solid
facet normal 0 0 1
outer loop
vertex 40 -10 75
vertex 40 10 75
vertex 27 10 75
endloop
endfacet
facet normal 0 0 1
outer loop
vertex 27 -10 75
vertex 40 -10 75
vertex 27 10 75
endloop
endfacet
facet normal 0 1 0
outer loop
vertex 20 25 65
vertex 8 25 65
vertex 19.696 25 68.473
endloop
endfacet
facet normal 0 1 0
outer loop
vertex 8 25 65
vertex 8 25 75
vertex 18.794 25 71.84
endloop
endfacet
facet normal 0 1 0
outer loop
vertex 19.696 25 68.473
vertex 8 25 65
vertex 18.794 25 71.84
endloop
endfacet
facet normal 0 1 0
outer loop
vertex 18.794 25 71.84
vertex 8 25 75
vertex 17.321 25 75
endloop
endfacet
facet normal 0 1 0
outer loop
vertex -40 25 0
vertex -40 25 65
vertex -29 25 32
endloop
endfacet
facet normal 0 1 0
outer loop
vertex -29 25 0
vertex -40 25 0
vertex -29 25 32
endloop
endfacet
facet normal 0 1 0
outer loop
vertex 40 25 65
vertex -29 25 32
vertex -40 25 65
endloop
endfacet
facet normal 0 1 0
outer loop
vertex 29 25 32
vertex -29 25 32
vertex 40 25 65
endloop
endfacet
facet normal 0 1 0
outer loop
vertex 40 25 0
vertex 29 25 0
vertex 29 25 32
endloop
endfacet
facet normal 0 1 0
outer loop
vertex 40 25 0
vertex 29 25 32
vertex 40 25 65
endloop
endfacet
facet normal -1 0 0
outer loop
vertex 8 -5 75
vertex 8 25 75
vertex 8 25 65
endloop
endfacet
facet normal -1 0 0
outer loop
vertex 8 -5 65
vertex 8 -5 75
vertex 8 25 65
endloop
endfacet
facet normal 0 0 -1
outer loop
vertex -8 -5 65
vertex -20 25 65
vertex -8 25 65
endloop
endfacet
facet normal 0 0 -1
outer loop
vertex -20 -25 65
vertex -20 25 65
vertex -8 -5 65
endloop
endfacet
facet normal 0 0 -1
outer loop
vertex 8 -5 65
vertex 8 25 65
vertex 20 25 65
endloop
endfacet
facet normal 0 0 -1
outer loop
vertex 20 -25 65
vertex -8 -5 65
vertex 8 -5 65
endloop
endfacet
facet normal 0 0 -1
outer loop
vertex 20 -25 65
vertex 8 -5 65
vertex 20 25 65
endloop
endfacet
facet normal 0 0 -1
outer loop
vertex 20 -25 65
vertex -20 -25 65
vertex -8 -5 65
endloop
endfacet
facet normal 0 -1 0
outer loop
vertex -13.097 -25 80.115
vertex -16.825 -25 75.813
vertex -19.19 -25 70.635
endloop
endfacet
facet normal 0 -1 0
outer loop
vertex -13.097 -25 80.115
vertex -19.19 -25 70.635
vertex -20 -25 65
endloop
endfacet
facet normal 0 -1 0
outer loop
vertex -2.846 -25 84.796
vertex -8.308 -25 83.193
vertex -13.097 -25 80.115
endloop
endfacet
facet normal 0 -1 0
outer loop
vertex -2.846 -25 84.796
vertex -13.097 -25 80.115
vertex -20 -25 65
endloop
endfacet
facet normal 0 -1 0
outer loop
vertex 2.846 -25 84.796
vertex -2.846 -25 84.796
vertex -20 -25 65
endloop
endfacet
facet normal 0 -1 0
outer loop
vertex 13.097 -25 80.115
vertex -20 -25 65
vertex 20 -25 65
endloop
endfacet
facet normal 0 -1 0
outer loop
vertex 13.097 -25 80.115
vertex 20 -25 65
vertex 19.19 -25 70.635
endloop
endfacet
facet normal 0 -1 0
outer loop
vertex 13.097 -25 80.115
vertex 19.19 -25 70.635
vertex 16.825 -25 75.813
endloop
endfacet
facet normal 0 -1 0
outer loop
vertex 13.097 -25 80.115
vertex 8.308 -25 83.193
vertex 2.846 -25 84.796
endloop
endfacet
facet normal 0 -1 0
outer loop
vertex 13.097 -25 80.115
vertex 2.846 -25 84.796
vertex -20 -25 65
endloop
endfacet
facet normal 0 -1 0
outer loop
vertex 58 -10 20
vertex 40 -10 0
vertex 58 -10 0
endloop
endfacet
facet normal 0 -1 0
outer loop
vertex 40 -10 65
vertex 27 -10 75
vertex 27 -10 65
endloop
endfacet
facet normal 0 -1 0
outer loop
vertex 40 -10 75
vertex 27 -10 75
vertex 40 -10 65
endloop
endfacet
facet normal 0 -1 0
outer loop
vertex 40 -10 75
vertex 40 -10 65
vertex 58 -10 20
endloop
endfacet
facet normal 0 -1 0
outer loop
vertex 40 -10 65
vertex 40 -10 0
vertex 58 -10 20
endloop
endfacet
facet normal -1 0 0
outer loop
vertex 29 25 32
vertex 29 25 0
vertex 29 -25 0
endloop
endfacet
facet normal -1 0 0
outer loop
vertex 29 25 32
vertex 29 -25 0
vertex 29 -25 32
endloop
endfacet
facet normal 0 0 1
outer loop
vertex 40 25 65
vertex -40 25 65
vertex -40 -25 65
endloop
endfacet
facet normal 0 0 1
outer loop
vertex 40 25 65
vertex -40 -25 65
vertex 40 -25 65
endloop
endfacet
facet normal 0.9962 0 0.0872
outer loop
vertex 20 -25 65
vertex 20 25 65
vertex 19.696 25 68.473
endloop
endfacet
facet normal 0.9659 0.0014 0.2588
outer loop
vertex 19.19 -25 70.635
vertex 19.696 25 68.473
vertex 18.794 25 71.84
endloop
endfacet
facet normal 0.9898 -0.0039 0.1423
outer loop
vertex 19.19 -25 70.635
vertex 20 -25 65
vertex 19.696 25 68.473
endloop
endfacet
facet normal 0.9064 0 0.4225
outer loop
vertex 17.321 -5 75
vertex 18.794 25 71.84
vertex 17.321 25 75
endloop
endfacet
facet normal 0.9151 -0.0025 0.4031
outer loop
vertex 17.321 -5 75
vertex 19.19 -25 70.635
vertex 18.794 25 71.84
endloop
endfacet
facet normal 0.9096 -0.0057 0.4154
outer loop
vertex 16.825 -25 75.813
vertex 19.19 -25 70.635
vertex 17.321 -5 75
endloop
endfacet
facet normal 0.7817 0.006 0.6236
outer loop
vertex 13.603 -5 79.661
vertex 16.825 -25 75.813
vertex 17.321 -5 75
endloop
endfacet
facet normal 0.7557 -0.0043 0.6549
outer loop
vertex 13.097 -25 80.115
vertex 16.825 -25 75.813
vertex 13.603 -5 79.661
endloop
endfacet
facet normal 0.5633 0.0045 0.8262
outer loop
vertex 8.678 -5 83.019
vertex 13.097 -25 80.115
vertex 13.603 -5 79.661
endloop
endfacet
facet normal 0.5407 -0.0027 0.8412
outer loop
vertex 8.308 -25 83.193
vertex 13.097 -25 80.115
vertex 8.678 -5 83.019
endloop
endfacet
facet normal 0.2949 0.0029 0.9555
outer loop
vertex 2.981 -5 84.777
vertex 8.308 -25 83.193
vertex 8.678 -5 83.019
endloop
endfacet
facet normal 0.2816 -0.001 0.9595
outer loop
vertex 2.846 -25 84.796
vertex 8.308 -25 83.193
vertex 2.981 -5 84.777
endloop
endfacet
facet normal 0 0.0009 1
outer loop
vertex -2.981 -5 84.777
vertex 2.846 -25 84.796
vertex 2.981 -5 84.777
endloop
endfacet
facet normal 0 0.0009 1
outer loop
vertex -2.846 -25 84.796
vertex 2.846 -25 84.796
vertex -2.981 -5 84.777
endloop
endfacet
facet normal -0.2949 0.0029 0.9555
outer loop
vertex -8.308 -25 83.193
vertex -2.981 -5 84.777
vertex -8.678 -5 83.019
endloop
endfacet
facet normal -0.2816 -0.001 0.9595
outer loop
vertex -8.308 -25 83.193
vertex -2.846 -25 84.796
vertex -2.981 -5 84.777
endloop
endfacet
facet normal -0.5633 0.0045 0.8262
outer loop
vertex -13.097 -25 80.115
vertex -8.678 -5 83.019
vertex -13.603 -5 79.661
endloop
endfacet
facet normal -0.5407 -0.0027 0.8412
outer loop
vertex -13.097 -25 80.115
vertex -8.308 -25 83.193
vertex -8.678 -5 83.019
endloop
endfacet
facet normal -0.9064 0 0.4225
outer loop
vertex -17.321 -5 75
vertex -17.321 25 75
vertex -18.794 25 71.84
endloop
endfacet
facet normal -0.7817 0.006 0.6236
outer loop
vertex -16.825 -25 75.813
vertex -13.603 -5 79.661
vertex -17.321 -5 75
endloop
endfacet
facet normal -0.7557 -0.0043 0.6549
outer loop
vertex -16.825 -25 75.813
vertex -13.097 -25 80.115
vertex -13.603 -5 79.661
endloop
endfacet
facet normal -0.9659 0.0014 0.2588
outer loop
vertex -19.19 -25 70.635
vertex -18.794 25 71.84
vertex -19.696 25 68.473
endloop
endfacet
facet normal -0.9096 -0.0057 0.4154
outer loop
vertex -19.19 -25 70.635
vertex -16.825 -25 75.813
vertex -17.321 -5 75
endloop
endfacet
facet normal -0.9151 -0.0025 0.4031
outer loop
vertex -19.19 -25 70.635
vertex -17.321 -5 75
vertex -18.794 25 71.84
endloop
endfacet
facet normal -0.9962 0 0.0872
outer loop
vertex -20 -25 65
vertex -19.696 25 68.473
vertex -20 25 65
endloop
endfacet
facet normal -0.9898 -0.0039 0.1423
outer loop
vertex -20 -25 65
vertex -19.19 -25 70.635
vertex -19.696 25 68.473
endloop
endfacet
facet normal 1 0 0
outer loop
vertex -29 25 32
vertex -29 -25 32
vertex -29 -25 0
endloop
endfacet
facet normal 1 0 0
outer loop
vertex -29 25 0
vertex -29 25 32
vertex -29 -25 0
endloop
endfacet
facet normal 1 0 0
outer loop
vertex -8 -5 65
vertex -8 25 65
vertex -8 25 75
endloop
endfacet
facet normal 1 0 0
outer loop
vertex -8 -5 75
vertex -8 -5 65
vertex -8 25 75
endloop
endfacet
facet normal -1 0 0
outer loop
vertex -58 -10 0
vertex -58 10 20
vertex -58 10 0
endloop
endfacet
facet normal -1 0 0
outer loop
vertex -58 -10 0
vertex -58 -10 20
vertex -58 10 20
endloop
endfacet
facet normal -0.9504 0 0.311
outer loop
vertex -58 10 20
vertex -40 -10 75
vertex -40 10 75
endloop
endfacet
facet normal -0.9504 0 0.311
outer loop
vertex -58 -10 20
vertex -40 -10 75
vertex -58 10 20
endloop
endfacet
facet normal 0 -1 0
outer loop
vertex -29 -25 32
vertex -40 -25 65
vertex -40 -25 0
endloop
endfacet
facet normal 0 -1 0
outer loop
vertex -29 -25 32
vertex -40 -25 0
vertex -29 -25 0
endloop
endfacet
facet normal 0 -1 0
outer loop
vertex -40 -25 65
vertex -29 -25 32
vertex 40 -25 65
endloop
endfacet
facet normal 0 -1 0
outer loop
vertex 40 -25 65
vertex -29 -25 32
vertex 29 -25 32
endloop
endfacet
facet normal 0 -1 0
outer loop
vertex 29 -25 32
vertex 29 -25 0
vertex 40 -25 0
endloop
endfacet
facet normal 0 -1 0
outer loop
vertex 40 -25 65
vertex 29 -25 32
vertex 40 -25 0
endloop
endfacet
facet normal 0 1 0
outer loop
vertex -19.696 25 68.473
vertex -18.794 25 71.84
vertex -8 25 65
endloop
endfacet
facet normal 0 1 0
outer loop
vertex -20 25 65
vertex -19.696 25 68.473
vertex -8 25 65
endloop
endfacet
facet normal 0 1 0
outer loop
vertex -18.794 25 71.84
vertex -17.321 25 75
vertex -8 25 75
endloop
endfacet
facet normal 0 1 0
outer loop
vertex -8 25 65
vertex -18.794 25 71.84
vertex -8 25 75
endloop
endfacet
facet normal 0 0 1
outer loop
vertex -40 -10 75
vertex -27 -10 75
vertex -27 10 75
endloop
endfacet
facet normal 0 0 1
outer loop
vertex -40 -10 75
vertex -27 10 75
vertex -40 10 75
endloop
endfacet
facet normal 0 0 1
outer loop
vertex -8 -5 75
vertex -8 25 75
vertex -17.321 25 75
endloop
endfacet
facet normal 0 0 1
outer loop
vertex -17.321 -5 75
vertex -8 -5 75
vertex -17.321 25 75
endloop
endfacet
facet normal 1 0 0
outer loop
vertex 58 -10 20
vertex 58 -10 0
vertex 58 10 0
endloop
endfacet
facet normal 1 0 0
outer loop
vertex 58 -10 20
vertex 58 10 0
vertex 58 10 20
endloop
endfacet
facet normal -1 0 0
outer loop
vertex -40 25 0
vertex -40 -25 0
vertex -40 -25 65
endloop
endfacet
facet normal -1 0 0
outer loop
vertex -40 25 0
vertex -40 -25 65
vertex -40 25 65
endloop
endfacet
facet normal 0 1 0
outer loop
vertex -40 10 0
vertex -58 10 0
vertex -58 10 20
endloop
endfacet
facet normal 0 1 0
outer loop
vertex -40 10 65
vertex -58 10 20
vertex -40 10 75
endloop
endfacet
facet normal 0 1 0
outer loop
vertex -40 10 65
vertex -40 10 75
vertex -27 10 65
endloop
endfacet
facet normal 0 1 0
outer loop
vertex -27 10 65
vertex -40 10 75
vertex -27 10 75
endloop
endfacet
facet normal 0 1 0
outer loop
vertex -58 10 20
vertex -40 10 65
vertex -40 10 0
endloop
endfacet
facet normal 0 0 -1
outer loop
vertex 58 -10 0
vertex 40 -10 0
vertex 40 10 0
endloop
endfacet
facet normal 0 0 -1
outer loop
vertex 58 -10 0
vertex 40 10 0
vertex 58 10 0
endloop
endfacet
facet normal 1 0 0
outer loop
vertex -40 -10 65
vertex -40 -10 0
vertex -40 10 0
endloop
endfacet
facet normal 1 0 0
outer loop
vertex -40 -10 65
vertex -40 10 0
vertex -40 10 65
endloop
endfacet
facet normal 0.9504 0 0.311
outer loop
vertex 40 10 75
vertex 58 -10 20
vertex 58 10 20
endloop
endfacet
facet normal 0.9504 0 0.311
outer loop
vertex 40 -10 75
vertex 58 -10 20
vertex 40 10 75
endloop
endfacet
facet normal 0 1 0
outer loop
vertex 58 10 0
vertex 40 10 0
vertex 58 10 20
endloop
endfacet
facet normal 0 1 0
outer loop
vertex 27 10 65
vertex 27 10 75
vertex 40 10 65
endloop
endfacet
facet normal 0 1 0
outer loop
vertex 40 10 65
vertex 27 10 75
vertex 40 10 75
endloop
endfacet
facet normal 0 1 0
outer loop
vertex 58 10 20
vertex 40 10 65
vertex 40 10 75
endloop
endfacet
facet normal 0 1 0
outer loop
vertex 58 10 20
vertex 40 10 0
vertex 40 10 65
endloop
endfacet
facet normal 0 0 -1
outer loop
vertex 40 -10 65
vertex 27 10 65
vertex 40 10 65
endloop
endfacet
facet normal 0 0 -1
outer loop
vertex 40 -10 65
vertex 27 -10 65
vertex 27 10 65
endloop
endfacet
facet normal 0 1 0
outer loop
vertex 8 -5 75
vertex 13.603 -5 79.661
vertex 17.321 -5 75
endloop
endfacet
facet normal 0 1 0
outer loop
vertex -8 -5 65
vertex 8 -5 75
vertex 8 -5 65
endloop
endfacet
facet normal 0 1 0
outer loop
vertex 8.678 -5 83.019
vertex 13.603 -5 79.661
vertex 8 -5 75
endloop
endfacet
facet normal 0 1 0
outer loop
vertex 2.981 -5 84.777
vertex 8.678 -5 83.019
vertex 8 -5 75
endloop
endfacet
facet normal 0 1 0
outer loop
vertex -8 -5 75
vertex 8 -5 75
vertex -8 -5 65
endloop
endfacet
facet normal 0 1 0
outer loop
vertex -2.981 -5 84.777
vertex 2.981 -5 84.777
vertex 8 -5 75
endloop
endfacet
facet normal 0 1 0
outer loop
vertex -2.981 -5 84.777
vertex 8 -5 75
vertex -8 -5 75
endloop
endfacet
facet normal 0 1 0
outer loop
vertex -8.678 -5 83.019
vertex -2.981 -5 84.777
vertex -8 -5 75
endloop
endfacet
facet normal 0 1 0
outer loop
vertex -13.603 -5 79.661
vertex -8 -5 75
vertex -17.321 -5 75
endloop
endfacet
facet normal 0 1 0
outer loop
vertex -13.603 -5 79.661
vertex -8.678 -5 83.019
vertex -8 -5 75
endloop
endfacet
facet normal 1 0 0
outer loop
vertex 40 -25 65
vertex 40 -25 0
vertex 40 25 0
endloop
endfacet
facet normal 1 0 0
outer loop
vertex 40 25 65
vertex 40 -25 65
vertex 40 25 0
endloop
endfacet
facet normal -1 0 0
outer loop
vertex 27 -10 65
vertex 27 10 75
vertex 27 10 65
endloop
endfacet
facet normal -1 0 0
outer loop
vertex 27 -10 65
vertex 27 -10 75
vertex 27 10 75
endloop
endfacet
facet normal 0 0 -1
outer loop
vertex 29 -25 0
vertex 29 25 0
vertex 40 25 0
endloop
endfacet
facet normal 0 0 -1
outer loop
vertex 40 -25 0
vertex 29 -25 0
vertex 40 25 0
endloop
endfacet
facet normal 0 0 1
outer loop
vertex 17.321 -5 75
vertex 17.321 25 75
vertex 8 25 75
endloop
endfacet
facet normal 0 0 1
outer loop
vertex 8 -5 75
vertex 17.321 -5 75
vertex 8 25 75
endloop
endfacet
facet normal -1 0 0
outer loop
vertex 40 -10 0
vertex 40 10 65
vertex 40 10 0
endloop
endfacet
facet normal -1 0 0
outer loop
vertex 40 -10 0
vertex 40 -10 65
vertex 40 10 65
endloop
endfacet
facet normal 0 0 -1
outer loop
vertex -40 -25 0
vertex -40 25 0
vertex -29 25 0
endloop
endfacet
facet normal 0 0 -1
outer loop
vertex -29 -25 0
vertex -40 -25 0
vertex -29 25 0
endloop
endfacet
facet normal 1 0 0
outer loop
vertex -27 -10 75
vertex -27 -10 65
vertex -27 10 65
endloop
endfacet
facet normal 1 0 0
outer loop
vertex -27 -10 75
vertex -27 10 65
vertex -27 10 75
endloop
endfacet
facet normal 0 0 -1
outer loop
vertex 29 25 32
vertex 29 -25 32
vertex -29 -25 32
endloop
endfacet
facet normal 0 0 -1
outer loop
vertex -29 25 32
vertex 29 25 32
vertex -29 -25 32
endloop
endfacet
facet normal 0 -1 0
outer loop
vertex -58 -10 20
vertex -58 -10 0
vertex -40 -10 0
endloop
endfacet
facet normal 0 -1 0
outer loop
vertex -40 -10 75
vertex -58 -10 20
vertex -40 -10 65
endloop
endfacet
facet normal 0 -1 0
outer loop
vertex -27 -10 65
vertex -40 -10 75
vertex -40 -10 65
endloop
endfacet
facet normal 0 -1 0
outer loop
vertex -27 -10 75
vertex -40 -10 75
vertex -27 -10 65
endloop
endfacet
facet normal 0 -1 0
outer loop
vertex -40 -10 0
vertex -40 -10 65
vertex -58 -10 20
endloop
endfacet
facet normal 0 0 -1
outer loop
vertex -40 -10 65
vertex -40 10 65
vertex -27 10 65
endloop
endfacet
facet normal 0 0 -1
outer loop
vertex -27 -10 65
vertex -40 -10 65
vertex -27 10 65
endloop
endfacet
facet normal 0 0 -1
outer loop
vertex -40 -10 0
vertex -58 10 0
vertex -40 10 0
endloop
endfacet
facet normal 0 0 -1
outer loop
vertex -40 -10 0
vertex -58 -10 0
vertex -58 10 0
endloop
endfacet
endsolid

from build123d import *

# Parameters (mm, degrees)
F0_W          = 80
F0_H          = 50
F1_DEPTH      = 65
F3_DEPTH      = 234.7
F5_DEPTH      = 50
F7_DEPTH      = 30
F9_DEPTH      = 10
F9_DEPTH_BACK = 10


with BuildPart() as f1:
    # F0 (on Top) → F1 (new body)
    with BuildSketch(Plane.XY):
        Rectangle(F0_W, F0_H)
    extrude(amount=F1_DEPTH)

    # F2 (on face) → F3 (cut)
    with BuildSketch(Plane.XZ.offset(25)):
        Polygon((-29, 0), (0, 0), (29, 0), (29, 32), (-29, 32), align=None)
    extrude(amount=-F3_DEPTH, mode=Mode.SUBTRACT)


with BuildPart() as f5:
    # F4 (on face) → F5 (new body, through all)
    with BuildSketch(Plane.XZ.offset(25)):
        with BuildLine():
            Line((-20, 65), (20, 65))
            ThreePointArc((20, 65), (0, 85), (-20, 65))
        make_face()
    extrude(amount=-F5_DEPTH)

    # F6 (on face) → F7 (cut)
    with BuildSketch(Plane(origin=(0, 25, 0), x_dir=(-1, 0, 0), z_dir=(0, 1, 0))):
        with BuildLine():
            Line((-8, 75), (8, 75))
            Line((8, 75), (17.320508, 75))
            ThreePointArc((17.320508, 75), (0, 85), (-17.320508, 75))
            Line((-17.320508, 75), (-8, 75))
        make_face()
        Polygon((-8, 65), (0, 65), (8, 65), (8, 75), (-8, 75), align=None)
    extrude(amount=-F7_DEPTH, mode=Mode.SUBTRACT)


with BuildPart() as f9:
    # F8 (on Front) → F9 (new body, two sides)
    with BuildSketch(Plane.XZ) as f9_sk:
        Polygon((40, 65), (40, 0), (58, 0), (58, 20), (40, 75), (27, 75), (27, 65), align=None)
        Polygon((-58, 0), (-40, 0), (-40, 65), (-27, 65), (-27, 75), (-40, 75), (-58, 20), align=None)
    extrude(amount=F9_DEPTH)
    extrude(f9_sk.sketch, amount=-F9_DEPTH_BACK)


solid = Compound([f1.part, f5.part, f9.part])
